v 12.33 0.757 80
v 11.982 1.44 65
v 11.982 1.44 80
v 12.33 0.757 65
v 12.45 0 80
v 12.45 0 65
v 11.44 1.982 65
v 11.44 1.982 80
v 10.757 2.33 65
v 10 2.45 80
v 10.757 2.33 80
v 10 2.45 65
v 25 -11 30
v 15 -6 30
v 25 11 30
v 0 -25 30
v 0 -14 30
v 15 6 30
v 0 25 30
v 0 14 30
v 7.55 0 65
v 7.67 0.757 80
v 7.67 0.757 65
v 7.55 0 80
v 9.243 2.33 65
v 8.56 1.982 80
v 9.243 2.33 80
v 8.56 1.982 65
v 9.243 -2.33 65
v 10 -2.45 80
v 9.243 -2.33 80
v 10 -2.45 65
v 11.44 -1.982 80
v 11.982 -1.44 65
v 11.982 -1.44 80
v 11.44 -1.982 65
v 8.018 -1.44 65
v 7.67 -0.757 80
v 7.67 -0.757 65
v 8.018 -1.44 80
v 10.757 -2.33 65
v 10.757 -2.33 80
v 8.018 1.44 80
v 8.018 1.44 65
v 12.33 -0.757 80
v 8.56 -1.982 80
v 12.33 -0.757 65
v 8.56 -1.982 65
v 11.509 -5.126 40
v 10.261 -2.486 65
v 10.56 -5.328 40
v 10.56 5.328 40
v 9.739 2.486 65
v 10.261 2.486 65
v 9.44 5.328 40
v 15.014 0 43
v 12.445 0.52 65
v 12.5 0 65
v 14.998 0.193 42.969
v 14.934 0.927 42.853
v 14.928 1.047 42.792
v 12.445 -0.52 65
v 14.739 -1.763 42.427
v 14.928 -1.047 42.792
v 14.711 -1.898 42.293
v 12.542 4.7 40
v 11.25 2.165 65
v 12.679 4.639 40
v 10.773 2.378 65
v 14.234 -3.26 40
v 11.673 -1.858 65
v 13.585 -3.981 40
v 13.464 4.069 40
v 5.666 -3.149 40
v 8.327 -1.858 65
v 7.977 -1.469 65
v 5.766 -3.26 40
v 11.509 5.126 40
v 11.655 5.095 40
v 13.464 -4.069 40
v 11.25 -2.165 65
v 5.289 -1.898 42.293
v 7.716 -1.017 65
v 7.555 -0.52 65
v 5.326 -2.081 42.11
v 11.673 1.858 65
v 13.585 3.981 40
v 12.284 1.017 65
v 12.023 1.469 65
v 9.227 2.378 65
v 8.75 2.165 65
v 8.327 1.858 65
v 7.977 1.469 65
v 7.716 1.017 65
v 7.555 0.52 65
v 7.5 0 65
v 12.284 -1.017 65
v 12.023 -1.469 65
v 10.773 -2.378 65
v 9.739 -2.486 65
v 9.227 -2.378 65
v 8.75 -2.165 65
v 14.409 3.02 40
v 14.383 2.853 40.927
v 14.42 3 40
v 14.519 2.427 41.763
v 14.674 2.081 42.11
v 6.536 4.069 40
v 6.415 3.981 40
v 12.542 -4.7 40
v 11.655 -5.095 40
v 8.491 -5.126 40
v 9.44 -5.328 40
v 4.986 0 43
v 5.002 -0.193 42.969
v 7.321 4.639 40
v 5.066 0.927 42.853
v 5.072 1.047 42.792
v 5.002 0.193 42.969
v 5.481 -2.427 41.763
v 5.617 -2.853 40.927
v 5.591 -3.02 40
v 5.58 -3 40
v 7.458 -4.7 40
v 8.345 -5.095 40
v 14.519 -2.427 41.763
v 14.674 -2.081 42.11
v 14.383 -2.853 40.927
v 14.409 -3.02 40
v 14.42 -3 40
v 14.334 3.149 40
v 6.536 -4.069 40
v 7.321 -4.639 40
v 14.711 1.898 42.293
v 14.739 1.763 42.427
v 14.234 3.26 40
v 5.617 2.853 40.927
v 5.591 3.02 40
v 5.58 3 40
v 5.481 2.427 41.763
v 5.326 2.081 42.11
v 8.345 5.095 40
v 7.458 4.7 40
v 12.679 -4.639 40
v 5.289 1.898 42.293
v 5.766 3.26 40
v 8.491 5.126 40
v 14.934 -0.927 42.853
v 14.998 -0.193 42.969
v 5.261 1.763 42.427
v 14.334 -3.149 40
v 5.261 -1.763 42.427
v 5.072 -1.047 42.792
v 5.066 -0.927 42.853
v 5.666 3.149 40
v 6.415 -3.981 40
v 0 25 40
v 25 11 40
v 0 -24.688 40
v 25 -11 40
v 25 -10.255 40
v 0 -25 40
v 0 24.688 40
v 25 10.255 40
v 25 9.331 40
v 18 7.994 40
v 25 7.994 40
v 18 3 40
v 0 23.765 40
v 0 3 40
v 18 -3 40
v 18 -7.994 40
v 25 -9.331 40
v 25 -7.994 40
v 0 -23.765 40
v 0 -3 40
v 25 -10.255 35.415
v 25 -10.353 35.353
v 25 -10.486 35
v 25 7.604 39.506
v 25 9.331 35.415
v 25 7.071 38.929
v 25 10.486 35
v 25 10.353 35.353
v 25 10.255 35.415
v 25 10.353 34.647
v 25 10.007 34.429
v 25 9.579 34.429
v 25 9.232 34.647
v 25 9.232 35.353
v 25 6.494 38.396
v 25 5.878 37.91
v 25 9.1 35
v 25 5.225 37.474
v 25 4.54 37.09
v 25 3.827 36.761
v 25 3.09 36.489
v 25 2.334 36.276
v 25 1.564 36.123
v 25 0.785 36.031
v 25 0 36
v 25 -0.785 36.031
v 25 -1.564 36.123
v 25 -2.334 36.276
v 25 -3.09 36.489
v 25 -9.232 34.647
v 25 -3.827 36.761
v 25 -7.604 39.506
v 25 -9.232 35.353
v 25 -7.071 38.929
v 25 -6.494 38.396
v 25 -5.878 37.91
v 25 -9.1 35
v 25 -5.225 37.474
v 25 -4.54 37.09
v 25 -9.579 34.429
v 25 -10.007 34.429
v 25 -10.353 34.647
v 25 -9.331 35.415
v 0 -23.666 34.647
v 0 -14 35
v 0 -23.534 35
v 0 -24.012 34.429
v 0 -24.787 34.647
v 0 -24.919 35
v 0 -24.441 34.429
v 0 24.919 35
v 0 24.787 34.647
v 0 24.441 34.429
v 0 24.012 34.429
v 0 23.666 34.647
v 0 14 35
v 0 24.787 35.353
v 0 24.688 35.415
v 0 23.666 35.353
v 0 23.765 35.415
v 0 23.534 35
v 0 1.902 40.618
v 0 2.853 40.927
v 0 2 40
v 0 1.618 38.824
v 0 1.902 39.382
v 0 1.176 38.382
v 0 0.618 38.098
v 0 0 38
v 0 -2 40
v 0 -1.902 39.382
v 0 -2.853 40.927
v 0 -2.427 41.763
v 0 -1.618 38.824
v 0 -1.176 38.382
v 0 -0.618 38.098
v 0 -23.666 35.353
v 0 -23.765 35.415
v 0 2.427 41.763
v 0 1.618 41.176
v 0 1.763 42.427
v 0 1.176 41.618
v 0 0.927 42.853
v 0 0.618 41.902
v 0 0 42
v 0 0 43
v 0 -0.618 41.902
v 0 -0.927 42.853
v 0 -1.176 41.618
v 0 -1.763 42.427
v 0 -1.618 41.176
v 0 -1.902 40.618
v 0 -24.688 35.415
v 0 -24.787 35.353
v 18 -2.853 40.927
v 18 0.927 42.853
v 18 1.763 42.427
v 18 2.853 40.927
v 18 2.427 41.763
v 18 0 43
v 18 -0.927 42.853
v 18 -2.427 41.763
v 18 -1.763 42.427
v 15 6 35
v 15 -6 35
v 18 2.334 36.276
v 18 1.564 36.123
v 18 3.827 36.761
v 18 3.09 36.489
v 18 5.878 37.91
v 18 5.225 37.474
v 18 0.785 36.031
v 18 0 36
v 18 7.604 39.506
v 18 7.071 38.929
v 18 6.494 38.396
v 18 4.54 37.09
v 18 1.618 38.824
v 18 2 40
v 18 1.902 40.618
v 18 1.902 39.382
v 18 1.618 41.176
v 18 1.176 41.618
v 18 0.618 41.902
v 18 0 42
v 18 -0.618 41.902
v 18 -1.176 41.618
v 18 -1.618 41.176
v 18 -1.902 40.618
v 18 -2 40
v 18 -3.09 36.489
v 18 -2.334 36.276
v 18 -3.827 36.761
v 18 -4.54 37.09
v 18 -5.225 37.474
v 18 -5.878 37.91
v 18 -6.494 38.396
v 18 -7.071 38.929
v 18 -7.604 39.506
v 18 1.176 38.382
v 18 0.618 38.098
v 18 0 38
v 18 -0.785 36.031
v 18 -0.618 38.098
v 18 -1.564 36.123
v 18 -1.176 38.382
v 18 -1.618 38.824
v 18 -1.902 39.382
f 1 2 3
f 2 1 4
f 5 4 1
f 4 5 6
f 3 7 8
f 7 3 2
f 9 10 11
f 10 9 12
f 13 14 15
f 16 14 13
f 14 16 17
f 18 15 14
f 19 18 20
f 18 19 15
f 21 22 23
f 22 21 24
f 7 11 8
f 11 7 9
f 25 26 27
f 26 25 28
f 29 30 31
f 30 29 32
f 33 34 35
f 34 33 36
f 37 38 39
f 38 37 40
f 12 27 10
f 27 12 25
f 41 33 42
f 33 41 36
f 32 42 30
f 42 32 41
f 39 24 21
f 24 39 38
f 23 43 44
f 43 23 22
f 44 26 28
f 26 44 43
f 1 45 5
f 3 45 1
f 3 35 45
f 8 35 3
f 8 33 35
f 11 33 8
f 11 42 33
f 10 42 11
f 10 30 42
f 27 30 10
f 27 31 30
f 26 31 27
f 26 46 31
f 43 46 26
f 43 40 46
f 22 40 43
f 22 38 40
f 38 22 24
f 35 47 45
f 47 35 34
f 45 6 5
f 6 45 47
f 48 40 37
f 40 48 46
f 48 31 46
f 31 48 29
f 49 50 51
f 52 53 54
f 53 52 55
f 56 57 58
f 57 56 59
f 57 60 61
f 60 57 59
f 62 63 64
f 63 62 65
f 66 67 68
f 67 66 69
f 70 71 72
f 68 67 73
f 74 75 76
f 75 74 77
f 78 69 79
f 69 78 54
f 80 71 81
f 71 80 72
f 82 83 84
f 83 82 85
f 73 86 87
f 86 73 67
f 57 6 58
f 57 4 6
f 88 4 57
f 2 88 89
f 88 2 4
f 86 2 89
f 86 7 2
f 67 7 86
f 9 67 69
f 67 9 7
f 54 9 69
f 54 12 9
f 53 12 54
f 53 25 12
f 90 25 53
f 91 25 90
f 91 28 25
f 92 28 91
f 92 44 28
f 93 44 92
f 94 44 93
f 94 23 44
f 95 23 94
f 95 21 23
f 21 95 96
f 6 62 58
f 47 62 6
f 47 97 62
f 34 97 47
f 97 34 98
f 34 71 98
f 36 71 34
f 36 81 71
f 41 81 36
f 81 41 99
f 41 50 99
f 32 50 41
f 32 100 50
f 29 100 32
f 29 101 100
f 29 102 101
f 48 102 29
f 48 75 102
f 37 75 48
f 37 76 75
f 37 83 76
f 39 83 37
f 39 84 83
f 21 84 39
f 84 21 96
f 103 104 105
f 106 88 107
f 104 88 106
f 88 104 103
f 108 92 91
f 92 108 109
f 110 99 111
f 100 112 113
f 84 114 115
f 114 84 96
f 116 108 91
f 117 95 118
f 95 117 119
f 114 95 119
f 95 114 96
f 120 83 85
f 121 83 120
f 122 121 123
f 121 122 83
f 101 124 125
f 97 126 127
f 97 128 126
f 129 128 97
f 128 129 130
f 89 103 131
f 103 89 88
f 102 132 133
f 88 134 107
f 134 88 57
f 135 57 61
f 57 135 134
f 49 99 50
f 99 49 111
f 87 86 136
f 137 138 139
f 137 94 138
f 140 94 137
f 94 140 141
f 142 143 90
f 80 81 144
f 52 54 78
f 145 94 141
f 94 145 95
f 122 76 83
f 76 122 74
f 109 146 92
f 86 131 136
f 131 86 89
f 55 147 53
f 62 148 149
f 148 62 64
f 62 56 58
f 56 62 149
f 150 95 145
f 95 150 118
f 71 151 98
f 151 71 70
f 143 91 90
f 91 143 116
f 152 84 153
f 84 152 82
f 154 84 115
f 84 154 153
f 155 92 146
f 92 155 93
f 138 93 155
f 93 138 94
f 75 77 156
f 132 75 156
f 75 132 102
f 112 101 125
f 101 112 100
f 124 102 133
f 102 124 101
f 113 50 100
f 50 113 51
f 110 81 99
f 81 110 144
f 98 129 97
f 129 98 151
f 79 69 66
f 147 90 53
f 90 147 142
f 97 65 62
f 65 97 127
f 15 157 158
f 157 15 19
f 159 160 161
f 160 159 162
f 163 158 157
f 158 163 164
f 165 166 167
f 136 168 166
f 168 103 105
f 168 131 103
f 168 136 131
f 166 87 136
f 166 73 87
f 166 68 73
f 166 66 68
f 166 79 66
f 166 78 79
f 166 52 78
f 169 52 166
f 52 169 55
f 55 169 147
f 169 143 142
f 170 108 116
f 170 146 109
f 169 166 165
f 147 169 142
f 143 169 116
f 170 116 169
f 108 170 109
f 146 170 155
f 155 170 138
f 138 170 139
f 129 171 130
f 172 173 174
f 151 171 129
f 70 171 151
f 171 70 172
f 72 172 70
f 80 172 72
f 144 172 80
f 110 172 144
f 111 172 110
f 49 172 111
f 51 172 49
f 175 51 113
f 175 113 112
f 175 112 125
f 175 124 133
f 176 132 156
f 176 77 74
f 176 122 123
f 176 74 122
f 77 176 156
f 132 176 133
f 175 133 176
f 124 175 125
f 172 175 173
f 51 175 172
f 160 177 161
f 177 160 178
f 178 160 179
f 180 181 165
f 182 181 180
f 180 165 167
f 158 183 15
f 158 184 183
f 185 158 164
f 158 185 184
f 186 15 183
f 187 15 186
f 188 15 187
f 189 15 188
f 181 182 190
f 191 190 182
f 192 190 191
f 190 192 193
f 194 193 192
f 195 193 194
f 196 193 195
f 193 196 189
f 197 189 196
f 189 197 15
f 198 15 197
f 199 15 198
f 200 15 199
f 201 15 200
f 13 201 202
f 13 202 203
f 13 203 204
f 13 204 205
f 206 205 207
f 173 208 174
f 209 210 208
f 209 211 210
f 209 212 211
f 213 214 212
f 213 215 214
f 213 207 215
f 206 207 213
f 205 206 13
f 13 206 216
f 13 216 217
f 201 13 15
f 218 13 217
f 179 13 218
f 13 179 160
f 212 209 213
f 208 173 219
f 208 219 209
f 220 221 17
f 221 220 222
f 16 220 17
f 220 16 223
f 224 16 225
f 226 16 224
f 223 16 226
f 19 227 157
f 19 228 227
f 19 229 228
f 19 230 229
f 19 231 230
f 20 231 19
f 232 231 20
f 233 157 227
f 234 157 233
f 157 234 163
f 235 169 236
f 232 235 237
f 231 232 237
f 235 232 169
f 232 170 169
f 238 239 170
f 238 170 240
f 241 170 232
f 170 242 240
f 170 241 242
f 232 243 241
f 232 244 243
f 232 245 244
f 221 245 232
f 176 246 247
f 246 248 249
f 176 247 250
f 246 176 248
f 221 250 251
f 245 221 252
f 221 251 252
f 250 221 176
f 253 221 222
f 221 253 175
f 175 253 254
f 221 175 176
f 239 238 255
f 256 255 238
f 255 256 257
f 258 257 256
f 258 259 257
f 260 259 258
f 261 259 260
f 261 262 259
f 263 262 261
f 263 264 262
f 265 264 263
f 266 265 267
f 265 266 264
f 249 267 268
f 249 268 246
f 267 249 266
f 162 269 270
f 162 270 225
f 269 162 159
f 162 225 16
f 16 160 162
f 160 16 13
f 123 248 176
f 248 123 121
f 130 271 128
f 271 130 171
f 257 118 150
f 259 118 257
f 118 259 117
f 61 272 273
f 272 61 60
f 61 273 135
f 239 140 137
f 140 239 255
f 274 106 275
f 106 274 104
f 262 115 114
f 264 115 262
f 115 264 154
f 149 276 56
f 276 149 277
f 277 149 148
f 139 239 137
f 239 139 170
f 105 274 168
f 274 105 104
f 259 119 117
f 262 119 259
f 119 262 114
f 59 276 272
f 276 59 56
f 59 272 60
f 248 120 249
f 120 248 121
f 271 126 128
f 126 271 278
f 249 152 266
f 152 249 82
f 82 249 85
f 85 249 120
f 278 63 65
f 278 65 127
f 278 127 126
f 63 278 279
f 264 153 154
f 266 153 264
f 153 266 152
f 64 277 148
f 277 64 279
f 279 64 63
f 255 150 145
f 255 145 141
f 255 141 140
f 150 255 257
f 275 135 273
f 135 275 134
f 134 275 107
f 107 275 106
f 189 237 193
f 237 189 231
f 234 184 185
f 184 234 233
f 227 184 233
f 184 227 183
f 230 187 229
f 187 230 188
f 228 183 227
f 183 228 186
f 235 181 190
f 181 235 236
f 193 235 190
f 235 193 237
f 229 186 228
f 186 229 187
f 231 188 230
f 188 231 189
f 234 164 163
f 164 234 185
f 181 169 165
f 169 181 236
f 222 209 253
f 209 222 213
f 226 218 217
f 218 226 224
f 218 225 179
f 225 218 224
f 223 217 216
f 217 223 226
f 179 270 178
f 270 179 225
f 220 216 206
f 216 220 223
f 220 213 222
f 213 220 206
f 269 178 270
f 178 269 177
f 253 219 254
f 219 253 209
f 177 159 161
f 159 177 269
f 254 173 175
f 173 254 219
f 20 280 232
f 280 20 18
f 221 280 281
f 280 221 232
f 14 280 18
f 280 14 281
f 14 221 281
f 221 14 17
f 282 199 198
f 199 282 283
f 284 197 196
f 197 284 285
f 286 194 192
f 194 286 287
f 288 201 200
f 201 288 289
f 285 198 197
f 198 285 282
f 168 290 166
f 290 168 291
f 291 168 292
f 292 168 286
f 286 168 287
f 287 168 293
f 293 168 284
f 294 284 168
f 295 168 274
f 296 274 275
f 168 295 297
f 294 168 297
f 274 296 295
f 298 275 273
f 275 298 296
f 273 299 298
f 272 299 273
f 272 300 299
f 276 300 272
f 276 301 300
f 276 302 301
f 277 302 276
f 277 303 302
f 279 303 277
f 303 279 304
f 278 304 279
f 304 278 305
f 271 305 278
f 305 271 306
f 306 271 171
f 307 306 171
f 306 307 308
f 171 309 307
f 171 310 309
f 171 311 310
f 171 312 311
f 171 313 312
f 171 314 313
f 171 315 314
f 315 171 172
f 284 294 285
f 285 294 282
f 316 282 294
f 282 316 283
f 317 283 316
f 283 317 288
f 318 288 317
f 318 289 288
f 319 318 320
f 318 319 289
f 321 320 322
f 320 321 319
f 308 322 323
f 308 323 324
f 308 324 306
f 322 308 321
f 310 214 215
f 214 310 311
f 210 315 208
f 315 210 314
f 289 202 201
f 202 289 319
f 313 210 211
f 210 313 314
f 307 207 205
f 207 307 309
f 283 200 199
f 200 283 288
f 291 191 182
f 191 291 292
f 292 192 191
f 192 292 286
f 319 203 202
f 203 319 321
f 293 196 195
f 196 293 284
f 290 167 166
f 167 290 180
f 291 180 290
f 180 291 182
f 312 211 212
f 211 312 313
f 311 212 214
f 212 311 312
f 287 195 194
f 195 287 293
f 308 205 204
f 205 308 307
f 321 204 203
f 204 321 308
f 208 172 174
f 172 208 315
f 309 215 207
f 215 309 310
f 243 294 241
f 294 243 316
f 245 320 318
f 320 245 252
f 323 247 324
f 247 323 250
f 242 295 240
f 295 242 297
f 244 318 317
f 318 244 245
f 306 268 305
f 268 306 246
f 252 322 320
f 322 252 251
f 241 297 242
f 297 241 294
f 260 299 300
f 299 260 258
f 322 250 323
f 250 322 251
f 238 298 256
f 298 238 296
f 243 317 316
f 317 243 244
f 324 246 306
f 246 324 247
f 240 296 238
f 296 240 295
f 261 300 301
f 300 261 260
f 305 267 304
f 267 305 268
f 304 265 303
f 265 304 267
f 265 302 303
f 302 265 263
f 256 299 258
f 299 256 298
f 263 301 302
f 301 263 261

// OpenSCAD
module slidingSlot(){
	difference(){
		rotate_extrude(){
			translate([40,0,0])
			polygon(points=[[0,0],[16,0],[16,10],[11,10],[11,7],[13,4],[13,3],[3,3],[3,4],[5,7],[5,10],[0,10]]);
		}
		translate([0,0,-5])
		linear_extrude(height=20)
		polygon(points=[[60,60],[-60,60],[0,0],[-60,-60],[60,-60]]);
	}
}

module waterNeedleHolder(xx,yy,zz){
	difference(){
		union(){
			// translate([5,0,zz+8])
			// rotate([90,0,90])
			// linear_extrude(height=15)
			// polygon(points=[[1,0],[1,5],[2,5],[0,12],[-2,5],[-1,5],[-1,0]]);
			
			//Top Scaffold Adaptor
			translate([10,0,zz]){
				cylinder(d=4.9,h=50,$fn=20);
				cylinder(d1=13,d2=5,h=35,$fn=30);
			}
		
			//Base
			translate([xx,yy,zz])
			linear_extrude(height=10)
			polygon(points=[[25,11],[25,-11],[0,-25],[0,25]]);

			//Odor Tube
			translate([xx,yy,zz+10])
			rotate([0,90,0])	
			cylinder(h=25,d=6,$fn=20);
			
			//Back Odor Tube Adaptor
			// translate([xx,yy,zz+9])
			// rotate([0,-90,0])
			// rotate_extrude($fn=20)
			// polygon(points=[[0,0],[1.2,0],[1.2,4],[1.4,4],[0,8]]);			
		}
		
		//Bottom Groove
		translate([xx,yy,zz-5])
		linear_extrude(height=10)
		polygon(points=[[15,6],[15,-6],[0,-14],[0,14]]);

		// //Nose Groove
		translate([xx+18,yy,zz+16])
		rotate([0,90,0])
		cylinder(h=20,d=20,$fn=80);
		
		// //Odor Tube
		// translate([xx+5,yy,zz+9])
		// rotate([0,90,0])
		// cylinder(h=32,d=2.5,$fn=20);
		
		//Odor Tube
		translate([xx-15,yy,zz+10])
		rotate([0,90,0])
		cylinder(h=60,d=4,$fn=20);
		
		//Left Needle Slot
		translate([xx-10,yy+30,zz+5])
		rotate([90,0,60]){
			cylinder(d=1.2,h=55,$fn=10);
			translate([-0.4,0,0])
			cube([0.8,10,55]);
		}
		
		//Right Needle Slot
		translate([xx-10,yy-30,zz+5])
		rotate([-90,0,-60]){
			cylinder(d=1.2,h=55,$fn=10);
			translate([-0.4,-10,0])
			cube([0.8,10,55]);
		}
		
		// translate([-5,-50,0])
		// cube([25.1,100,100]);	
	}
	
	//Odor tube fixer
	// translate([2,0,zz+6]){
		// cylinder(d1=4,d2=0.5,h=2.4,$fn=20);
	// }
}

module measureCube(){
	translate([29,-2.25,0])
	cube([20,4.5,4.5]);
}


module functionColumn(){
	
}

module mousePlatform(){
	translate([0,-100,0])
	color("grey",1.0){
		cube([200,200,10]);
		translate([60,50,0])
		cube([20,100,20]);
	}
	translate([50,0,37.5])
	rotate([0,90,0])
	{
		difference(){	
			difference(){
				color("white",0.7){
					cylinder(d=45,h=150);
				}
				translate([0,0,-10])
				cylinder(d=35,h=170);
			}
			translate([-30,-50,-10])
			cube([20,100,170]);
		}
	}
}


// mousePlatform();
// translate([70,0,20])
// slidingSlot();

waterNeedleHolder(0,0,30);

//measureCube();
